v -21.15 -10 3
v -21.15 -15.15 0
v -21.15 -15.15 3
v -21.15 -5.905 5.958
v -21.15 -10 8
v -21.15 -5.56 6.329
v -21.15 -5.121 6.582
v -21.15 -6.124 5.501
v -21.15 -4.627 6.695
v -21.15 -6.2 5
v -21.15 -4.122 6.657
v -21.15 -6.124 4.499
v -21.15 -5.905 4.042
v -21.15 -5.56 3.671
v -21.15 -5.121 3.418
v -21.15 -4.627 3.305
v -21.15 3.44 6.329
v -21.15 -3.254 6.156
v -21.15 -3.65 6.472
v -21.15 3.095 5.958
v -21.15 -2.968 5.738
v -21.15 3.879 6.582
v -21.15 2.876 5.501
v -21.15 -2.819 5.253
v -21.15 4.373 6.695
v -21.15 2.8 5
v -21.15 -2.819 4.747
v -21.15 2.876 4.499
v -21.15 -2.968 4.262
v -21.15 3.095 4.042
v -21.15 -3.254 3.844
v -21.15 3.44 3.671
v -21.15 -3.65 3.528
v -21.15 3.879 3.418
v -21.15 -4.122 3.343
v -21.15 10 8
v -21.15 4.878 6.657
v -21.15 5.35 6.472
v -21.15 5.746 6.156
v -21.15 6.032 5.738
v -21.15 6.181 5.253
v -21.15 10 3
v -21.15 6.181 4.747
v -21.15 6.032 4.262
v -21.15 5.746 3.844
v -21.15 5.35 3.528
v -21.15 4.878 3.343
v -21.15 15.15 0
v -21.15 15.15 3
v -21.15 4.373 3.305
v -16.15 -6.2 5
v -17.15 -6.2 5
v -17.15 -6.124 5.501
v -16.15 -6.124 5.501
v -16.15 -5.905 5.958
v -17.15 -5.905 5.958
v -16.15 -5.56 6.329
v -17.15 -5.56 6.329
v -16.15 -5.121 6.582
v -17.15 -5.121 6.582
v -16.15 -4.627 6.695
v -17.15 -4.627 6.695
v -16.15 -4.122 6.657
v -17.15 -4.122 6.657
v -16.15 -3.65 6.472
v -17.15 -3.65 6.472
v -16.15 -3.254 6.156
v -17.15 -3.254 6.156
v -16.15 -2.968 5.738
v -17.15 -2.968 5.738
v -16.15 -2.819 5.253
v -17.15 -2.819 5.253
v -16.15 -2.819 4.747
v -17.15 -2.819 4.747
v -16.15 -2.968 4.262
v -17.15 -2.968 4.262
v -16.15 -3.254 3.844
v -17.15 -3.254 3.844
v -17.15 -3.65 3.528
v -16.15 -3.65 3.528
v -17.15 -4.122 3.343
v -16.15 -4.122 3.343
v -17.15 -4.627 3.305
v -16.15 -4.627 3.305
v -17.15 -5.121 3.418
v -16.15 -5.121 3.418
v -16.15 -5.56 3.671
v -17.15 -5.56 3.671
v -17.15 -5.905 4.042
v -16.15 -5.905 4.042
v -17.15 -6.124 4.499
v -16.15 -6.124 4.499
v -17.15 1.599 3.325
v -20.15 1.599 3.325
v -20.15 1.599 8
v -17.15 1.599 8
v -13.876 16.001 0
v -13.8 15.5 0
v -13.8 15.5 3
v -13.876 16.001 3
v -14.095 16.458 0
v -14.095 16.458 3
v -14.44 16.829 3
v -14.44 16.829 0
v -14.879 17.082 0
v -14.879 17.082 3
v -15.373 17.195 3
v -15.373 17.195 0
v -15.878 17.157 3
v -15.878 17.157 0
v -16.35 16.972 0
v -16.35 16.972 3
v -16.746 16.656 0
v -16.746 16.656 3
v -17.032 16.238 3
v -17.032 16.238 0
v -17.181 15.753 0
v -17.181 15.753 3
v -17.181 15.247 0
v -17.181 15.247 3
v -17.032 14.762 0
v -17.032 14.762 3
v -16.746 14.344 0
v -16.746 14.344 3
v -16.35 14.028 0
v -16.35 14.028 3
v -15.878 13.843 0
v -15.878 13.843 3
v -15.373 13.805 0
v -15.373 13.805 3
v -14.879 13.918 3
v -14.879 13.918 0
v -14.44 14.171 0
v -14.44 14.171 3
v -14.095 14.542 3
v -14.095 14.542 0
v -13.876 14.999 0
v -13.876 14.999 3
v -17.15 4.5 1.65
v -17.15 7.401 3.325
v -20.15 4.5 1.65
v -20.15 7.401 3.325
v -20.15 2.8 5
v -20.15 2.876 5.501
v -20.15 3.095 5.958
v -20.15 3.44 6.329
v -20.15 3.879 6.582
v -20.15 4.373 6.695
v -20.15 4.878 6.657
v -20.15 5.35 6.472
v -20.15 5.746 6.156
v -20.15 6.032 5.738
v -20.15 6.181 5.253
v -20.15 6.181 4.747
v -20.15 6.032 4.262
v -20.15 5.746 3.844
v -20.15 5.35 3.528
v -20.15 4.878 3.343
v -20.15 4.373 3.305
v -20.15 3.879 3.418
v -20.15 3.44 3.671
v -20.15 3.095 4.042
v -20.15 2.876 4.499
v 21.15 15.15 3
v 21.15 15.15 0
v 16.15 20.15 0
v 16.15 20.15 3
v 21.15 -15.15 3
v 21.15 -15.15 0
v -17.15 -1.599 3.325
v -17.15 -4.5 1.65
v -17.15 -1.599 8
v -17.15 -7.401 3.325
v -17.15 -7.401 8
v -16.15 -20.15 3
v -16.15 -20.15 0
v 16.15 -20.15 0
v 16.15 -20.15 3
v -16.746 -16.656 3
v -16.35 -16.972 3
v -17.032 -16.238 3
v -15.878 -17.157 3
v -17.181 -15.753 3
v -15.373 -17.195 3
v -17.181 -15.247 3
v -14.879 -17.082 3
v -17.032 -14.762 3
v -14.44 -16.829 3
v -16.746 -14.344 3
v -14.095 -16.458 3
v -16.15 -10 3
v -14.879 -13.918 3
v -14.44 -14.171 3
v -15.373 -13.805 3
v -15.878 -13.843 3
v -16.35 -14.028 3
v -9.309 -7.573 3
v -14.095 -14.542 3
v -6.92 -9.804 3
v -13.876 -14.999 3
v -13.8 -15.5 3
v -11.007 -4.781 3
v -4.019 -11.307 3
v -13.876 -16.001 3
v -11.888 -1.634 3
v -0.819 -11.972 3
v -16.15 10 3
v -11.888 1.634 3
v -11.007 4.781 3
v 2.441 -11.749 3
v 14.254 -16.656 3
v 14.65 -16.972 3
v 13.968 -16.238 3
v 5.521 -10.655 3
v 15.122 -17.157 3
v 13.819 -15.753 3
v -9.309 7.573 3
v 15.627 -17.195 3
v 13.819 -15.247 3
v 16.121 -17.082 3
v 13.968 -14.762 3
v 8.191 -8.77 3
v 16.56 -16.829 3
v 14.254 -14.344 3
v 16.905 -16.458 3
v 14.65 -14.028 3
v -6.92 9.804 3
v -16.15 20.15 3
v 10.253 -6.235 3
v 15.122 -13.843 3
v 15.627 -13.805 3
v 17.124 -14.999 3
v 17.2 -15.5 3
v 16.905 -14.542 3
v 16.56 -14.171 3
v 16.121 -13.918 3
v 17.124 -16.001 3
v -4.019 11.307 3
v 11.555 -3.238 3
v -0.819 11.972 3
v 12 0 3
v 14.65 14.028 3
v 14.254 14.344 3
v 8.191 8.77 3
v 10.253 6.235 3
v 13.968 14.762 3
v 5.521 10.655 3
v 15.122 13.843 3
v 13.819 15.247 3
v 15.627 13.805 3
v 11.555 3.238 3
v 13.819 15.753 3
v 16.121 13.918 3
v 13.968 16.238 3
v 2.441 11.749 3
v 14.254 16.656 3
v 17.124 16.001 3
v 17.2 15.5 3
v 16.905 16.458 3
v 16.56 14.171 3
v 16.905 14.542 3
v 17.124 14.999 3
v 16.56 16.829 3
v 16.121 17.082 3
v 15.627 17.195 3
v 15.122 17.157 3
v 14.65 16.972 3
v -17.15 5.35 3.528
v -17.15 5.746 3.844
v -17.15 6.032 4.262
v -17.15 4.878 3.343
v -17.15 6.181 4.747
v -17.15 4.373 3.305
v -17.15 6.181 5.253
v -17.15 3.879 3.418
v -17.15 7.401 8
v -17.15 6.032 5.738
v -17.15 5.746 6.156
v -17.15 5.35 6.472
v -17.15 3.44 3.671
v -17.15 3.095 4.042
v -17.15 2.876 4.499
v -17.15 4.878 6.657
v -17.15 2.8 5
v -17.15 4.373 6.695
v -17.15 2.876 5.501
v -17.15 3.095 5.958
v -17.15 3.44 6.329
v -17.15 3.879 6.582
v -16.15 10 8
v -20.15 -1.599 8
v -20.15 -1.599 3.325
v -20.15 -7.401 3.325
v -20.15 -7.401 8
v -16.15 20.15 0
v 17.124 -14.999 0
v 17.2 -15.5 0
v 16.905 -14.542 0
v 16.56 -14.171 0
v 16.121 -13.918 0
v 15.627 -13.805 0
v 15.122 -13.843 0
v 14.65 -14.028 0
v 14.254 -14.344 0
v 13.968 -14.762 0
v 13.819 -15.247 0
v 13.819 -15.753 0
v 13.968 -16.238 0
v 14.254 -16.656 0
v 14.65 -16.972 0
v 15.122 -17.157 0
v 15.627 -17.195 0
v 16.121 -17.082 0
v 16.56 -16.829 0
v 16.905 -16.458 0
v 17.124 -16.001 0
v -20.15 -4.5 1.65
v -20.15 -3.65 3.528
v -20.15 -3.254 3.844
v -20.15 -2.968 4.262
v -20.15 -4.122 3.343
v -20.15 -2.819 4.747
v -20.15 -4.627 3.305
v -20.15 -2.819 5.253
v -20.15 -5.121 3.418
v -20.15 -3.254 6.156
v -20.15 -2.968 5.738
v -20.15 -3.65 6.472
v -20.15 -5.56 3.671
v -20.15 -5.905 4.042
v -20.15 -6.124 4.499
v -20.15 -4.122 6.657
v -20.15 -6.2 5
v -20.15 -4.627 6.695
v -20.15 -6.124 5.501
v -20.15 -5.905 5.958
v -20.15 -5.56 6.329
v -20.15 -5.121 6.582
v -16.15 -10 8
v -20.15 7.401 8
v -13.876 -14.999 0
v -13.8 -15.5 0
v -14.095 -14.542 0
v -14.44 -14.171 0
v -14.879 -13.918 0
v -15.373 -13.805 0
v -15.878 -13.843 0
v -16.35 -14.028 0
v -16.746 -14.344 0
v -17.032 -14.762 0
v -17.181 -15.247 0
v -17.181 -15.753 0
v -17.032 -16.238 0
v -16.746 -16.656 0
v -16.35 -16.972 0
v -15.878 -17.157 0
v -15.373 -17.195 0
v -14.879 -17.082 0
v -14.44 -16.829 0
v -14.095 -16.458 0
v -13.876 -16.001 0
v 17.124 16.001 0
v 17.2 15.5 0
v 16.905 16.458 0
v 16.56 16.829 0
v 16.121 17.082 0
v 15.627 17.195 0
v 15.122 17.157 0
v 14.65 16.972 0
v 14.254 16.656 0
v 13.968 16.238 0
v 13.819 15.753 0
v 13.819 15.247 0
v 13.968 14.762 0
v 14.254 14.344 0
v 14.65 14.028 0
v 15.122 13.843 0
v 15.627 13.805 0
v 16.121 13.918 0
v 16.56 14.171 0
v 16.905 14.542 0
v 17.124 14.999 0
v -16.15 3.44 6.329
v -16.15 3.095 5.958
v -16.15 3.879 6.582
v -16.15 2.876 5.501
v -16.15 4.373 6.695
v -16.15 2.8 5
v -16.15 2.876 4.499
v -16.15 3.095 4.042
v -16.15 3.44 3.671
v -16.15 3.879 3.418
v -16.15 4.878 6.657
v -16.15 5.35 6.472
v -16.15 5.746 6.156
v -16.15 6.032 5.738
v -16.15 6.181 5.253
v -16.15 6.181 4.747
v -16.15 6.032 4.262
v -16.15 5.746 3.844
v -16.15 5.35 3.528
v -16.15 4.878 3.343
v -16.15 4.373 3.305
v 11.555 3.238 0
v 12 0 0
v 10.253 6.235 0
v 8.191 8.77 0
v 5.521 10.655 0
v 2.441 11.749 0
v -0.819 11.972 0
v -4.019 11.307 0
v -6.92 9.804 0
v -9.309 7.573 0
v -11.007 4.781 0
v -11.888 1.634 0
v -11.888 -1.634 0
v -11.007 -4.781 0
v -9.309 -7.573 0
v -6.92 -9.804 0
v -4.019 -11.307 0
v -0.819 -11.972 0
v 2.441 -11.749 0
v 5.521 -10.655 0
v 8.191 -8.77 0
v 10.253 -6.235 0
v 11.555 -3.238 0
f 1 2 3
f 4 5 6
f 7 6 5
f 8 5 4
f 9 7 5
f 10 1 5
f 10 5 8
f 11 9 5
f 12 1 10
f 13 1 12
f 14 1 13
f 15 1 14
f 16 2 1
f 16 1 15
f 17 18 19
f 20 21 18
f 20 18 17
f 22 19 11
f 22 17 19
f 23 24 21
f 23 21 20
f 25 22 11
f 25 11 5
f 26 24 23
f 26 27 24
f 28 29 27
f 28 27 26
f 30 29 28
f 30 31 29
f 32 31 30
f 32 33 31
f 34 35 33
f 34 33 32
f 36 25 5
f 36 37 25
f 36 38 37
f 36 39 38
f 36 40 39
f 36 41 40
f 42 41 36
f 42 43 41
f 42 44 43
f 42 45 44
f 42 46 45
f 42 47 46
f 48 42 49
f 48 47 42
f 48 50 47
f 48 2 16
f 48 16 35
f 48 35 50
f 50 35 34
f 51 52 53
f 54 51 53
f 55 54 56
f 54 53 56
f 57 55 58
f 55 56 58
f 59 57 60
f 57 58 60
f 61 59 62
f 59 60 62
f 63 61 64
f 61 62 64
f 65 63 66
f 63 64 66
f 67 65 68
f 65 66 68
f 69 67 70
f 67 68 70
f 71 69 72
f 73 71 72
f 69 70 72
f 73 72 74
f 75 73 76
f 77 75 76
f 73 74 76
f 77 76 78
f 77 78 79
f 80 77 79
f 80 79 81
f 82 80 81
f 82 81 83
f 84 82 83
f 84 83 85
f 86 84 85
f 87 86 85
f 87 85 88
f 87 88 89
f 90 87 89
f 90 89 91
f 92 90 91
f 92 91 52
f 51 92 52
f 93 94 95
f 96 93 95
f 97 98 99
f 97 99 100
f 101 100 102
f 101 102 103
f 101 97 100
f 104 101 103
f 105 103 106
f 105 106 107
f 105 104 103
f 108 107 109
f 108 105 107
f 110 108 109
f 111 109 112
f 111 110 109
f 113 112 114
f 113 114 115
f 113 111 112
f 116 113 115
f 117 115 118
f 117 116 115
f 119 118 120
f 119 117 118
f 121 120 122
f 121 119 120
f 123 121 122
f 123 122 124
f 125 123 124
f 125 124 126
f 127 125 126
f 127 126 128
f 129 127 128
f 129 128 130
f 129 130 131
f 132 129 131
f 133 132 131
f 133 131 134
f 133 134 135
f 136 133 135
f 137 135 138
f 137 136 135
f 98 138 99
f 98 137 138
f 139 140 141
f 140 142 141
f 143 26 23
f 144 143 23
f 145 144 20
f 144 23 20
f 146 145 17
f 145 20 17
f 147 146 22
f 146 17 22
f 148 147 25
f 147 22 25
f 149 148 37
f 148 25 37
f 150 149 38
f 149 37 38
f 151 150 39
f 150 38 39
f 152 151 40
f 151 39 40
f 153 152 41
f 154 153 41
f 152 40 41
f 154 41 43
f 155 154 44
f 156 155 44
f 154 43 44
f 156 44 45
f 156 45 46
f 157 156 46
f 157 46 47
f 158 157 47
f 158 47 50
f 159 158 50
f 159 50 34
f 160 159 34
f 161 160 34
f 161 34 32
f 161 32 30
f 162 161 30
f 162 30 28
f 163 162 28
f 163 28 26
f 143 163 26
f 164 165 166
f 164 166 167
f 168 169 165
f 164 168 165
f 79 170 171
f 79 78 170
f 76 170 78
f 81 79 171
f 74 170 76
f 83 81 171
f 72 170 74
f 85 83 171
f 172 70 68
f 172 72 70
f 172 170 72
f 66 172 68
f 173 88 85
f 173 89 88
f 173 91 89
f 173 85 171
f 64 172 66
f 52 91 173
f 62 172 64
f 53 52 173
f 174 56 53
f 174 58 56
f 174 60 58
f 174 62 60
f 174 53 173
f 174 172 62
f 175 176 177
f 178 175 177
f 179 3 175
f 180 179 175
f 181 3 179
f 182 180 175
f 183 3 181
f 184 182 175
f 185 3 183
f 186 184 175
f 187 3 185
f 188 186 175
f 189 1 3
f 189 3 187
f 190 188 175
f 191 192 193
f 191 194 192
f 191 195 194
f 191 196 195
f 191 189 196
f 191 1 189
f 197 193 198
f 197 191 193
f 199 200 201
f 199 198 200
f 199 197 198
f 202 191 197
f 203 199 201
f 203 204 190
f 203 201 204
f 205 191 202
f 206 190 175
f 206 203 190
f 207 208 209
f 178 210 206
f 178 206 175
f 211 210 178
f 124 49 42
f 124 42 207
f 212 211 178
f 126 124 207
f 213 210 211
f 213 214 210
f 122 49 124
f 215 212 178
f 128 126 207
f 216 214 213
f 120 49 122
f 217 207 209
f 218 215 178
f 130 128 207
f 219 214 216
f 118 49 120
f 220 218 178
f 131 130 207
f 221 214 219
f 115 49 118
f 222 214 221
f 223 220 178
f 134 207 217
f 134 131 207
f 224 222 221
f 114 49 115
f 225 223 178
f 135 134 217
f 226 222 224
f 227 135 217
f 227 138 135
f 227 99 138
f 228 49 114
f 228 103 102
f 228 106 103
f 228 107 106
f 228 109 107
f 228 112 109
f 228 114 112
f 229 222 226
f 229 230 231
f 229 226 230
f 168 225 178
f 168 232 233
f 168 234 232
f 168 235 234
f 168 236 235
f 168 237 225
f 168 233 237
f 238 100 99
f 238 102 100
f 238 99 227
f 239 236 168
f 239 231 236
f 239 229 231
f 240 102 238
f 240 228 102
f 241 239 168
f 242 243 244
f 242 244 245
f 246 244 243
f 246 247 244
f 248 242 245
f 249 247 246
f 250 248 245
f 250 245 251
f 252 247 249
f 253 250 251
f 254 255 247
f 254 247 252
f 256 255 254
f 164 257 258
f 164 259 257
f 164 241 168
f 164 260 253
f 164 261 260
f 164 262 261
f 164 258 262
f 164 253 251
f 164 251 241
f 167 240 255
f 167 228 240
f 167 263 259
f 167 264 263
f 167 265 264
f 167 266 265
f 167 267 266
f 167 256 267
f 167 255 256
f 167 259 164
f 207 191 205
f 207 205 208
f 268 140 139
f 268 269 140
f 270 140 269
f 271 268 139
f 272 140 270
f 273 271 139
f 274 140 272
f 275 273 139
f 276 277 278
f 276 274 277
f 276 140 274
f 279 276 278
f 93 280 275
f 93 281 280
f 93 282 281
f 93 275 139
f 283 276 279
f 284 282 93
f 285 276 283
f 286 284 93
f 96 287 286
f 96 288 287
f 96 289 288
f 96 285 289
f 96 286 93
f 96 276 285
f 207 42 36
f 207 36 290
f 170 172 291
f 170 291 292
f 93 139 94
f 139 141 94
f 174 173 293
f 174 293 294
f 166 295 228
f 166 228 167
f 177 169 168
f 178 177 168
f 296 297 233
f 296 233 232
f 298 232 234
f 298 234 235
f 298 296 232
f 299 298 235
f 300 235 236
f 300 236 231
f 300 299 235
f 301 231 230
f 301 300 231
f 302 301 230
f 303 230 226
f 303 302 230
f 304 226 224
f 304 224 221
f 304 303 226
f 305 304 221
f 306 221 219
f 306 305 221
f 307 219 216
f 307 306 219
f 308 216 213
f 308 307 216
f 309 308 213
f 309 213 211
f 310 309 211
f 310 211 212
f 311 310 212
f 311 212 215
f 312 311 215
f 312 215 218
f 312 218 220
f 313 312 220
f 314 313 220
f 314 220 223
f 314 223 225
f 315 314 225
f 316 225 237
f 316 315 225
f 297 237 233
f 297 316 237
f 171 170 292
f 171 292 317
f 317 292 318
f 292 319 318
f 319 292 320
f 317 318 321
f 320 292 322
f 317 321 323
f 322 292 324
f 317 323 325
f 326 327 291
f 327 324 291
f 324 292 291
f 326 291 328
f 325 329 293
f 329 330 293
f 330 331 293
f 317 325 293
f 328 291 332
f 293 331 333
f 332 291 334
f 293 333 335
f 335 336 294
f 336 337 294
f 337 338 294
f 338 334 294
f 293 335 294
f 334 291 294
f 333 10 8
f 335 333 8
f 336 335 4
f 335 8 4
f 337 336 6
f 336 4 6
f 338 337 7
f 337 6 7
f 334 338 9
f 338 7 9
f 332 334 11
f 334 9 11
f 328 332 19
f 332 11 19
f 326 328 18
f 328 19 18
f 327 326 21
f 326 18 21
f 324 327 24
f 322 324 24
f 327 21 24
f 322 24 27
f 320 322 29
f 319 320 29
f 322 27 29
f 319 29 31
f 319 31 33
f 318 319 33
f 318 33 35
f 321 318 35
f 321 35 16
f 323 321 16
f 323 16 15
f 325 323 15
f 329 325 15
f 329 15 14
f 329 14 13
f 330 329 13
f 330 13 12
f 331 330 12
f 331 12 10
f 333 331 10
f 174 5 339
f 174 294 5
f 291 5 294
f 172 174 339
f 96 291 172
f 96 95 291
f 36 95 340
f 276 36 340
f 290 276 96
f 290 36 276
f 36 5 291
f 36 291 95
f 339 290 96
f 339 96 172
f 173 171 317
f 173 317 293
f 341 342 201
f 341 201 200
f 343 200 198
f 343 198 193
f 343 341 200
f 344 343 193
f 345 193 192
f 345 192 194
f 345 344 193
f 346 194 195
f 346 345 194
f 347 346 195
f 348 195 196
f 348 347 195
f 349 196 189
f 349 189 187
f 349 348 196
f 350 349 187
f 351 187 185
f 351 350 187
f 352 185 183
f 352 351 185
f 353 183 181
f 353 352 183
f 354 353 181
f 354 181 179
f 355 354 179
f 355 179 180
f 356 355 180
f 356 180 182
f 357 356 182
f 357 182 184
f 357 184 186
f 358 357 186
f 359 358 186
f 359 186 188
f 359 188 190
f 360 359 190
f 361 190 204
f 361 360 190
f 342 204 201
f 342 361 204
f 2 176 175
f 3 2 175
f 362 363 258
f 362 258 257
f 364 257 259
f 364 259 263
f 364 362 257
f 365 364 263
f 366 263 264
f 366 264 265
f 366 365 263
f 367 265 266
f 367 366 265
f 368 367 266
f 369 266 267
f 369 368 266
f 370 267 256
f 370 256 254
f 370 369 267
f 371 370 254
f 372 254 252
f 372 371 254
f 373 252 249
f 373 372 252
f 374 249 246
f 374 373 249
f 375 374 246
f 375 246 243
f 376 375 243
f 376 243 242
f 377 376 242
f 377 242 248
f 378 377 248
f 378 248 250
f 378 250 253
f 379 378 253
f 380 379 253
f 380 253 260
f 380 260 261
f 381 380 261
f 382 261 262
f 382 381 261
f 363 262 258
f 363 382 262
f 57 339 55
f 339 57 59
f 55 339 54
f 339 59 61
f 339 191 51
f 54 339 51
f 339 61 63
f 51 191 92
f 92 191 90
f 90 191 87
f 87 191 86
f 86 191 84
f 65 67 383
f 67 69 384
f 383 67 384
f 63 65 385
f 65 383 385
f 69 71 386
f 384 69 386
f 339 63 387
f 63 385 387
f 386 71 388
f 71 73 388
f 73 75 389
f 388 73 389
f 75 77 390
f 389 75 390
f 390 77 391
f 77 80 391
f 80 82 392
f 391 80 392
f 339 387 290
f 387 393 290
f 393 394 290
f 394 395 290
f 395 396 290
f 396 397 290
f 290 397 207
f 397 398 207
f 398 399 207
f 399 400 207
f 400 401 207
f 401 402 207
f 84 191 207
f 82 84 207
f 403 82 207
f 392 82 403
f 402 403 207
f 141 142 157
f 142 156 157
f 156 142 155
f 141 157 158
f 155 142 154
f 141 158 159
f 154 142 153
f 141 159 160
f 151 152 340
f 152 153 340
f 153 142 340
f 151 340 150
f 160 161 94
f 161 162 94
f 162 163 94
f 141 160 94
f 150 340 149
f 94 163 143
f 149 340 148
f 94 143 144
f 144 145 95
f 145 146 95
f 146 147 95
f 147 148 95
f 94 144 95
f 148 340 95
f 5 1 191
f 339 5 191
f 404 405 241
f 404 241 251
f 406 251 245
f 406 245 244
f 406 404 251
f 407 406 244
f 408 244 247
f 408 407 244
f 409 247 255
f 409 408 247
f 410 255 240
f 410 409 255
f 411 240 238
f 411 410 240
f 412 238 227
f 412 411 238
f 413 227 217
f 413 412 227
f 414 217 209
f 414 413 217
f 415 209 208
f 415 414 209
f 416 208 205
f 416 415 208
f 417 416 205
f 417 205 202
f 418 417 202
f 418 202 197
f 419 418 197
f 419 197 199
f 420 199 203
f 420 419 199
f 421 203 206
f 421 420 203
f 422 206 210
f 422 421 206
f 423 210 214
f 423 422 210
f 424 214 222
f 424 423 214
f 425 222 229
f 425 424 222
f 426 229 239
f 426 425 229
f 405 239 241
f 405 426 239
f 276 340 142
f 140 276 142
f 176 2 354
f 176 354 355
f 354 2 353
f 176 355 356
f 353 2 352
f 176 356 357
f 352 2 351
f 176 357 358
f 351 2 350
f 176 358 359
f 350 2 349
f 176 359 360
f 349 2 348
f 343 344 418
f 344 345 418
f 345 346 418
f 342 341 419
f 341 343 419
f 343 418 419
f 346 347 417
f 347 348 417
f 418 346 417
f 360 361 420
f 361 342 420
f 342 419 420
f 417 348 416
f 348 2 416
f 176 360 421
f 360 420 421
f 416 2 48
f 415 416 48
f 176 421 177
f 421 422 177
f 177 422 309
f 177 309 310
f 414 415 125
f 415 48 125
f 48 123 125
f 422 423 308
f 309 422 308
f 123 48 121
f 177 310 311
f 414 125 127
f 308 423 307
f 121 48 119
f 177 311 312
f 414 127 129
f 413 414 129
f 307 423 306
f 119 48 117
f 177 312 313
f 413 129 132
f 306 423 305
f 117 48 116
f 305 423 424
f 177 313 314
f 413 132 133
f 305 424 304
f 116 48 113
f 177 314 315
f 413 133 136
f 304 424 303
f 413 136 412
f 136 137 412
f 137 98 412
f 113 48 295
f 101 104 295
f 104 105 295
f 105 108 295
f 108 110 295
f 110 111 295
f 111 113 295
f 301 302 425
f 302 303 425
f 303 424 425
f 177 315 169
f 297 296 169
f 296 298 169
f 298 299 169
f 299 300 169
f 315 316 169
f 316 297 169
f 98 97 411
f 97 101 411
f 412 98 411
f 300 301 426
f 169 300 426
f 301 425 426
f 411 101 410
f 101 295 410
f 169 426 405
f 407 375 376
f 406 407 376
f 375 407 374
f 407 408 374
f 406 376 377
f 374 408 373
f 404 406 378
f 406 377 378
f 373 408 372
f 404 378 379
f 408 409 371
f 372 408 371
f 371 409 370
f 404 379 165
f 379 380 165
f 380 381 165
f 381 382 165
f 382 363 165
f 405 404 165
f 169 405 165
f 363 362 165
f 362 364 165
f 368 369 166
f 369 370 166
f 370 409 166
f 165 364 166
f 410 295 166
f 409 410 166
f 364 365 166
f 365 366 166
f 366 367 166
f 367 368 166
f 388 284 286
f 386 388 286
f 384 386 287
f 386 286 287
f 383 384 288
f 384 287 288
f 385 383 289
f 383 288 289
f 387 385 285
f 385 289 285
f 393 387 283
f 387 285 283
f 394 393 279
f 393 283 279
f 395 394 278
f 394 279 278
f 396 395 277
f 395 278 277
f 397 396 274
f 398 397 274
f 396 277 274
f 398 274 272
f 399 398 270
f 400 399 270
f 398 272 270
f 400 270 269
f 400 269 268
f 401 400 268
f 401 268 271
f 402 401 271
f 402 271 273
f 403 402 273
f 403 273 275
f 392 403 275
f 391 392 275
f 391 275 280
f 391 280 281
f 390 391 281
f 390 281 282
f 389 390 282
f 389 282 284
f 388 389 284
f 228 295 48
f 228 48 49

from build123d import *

# Parameters (mm, degrees)
SKETCH_W        = 42.3
SKETCH_H        = 40.3
SKETCH_R        = 12
SKETCH_R_2      = 1.7
PAD_DEPTH       = 3
CHAMFER_SIZE    = 5
SKETCH001_W     = 5
SKETCH001_H     = 20
PAD001_DEPTH    = 5
SKETCH002_R     = 1.7
POCKET_DEPTH    = 42.301
POCKET001_DEPTH = 1.5


with BuildPart() as part:
    # Sketch → Pad (new body)
    with BuildSketch(Plane.XY):
        Rectangle(SKETCH_W, SKETCH_H)
        Circle(SKETCH_R, mode=Mode.SUBTRACT)
        with Locations((-15.5, 15.5)):
            Circle(SKETCH_R_2, mode=Mode.SUBTRACT)
        with Locations((-15.5, -15.5)):
            Circle(SKETCH_R_2, mode=Mode.SUBTRACT)
        with Locations((15.5, -15.5)):
            Circle(SKETCH_R_2, mode=Mode.SUBTRACT)
        with Locations((15.5, 15.5)):
            Circle(SKETCH_R_2, mode=Mode.SUBTRACT)
    extrude(amount=PAD_DEPTH)

    # Chamfer
    chamfer_edges = [part.edges().sort_by_distance(p)[0] for p in [
        (21.15, -20.15, 1.5),
        (-21.15, -20.15, 1.5),
        (21.15, 20.15, 1.5),
        (-21.15, 20.15, 1.5),
    ]]
    chamfer(chamfer_edges, length=CHAMFER_SIZE)

    # Sketch001 (on Face5 of Chamfer) → Pad001 (join)
    with BuildSketch(Plane.XY.offset(3)):
        with Locations((-18.65, 0)):
            Rectangle(SKETCH001_W, SKETCH001_H)
    extrude(amount=PAD001_DEPTH)

    # Sketch002 (on Face19 of Pad001) → Pocket (cut, through all)
    with BuildSketch(Plane(origin=(-21.15, 0, 0), x_dir=(0, -1, 0), z_dir=(-1, 0, 0))):
        with Locations((-4.5, 5)):
            Circle(SKETCH002_R)
        with Locations((4.5, 5)):
            Circle(SKETCH002_R)
    extrude(amount=-POCKET_DEPTH, mode=Mode.SUBTRACT)

    # Sketch003 (on DatumPlane) → Pocket001 (cut, symmetric)
    with BuildSketch(Plane(origin=(-18.65, 0, 0), x_dir=(0, -1, 0), z_dir=(-1, 0, 0))):
        Polygon((4.5, 1.65), (7.401185, 3.325), (7.401185, 13.325), (1.598815, 13.325), (1.598815, 3.325), align=None)
        Polygon((-4.5, 1.65), (-1.598815, 3.325), (-1.598815, 13.325), (-7.401185, 13.325), (-7.401185, 3.325), align=None)
    extrude(amount=POCKET001_DEPTH, both=True, mode=Mode.SUBTRACT)


solid = part.part
